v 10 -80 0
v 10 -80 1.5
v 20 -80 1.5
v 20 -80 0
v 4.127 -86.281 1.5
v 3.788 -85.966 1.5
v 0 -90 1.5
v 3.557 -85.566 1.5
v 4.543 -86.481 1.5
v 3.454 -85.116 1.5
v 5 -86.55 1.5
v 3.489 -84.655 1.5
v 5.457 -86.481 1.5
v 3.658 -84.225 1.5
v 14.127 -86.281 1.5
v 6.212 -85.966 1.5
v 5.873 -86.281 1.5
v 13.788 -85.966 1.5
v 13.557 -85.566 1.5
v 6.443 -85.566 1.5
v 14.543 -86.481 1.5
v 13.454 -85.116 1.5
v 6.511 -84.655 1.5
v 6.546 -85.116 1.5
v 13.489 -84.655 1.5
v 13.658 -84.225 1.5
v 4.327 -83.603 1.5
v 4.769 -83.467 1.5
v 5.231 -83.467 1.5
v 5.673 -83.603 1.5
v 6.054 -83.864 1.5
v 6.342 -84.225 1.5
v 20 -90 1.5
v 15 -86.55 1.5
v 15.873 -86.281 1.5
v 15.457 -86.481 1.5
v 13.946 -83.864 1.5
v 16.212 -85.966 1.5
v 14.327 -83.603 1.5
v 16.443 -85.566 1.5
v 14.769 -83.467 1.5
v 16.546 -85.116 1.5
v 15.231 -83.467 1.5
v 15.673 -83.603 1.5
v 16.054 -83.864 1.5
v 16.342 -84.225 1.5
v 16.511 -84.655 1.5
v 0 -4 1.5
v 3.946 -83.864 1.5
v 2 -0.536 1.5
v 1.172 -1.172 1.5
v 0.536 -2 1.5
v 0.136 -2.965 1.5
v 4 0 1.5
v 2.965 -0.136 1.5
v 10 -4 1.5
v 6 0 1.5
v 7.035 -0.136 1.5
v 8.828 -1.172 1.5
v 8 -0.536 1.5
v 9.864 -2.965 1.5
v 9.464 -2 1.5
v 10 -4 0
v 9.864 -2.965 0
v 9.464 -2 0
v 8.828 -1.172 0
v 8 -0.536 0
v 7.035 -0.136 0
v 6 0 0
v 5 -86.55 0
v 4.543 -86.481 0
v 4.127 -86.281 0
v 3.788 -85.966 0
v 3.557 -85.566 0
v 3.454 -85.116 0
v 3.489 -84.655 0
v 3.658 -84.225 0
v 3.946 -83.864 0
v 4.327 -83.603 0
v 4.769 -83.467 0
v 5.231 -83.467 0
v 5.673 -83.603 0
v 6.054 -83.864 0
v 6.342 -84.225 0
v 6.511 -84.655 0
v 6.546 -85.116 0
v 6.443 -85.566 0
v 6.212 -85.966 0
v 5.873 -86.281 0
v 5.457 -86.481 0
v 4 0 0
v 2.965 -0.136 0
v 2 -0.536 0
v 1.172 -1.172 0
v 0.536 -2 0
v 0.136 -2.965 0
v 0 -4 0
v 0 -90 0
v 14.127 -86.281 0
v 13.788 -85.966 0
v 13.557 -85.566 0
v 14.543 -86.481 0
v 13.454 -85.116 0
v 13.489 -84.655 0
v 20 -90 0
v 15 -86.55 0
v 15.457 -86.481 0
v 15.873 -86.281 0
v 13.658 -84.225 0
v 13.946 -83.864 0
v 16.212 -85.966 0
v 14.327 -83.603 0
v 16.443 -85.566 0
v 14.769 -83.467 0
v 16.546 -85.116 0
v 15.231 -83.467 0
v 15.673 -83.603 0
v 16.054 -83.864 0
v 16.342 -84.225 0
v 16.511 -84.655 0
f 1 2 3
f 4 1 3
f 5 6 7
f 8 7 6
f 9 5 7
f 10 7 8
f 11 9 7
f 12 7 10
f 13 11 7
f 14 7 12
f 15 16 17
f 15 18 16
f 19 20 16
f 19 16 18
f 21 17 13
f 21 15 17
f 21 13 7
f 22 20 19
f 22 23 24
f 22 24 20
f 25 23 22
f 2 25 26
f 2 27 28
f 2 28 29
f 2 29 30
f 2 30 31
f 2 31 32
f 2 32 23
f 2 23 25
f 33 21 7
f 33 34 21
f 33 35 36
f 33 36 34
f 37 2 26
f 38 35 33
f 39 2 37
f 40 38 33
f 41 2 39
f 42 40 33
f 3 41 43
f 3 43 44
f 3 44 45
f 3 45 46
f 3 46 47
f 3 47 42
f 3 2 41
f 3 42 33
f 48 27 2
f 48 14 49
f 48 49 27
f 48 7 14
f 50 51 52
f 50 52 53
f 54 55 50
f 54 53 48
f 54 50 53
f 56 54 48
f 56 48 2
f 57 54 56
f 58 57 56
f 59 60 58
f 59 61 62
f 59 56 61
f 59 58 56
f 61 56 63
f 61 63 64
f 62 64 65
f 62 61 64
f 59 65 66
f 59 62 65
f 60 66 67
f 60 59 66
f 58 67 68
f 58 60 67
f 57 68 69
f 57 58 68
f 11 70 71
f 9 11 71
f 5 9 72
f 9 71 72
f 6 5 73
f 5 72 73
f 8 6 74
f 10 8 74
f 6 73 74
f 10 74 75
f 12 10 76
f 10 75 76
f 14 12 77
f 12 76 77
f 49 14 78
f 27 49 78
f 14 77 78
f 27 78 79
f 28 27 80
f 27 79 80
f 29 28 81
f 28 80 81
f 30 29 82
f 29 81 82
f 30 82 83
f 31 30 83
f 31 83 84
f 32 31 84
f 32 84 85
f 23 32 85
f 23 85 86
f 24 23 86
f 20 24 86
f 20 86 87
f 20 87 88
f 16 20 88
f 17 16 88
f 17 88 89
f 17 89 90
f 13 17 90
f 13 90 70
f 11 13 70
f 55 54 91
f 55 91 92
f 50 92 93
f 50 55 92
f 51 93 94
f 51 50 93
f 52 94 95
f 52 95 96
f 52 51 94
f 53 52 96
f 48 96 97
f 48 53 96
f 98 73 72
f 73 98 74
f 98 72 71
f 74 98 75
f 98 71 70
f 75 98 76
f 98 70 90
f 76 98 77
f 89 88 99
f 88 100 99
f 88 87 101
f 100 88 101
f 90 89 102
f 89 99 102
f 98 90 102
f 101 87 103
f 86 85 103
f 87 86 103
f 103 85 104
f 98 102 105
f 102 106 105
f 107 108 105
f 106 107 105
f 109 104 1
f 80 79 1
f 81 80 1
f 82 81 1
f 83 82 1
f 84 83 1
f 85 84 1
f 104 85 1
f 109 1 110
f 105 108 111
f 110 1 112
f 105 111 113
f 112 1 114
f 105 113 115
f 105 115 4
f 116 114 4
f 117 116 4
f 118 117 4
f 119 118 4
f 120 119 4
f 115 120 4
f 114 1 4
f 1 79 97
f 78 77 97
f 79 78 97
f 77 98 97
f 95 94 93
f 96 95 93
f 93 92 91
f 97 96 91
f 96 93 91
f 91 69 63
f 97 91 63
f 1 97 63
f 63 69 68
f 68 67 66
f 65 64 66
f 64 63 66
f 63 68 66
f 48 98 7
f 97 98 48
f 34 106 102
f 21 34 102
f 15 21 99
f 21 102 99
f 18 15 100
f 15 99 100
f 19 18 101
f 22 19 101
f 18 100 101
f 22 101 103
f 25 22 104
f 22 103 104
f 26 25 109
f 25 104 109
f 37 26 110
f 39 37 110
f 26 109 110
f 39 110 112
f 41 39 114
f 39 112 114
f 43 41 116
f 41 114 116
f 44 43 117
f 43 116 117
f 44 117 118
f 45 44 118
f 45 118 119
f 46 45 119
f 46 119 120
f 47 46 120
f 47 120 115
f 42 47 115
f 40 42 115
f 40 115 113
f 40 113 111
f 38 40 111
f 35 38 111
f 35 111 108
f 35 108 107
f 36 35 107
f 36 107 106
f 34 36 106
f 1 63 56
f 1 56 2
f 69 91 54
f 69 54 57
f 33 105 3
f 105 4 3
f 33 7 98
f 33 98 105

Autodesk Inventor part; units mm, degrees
ref_plane "YZ Plane" through (0, 0, 0) normal (1, 0, 0) x (0, 1, 0)
ref_plane "XZ Plane" through (0, 0, 0) normal (0, 1, 0) x (-1, 0, 0)
ref_plane "XY Plane" through (0, 0, 0) normal (0, 0, 1) x (1, 0, 0)
sketch "スケッチ1" plane through (0, 0, 0) normal (0, 0, 1) x (1, 0, 0)
  line L0 (0, 0) -> (10, 0)
  line L1 (10, 0) -> (10, -80)
  line L2 (10, -80) -> (0, -80)
  line L3 (0, -80) -> (0, 0)
  dimension "d0" = 10
  dimension "d1" = 80
extrude "押し出し1" add sketch "スケッチ1" along normal blind 1.5
fillet "フィレット1" radius 4 2 edges at (10, 0, 0.75) (0, 0, 0.75)
sketch "スケッチ9" plane through (0, -80, 0) normal (0, -1, 0) x (1, 0, 0)
  line L0 (0, 0) -> (20, 0)
  line L1 (20, 0) -> (20, 1.5)
  line L2 (20, 1.5) -> (0, 1.5)
  line L3 (0, 1.5) -> (0, 0)
  line L4 (10, 0) -> (10, 1.5) projected
  line L5 (10, 0) -> (0, 0) projected
  dimension "d35" = 20
  dimension "d36" = 1.5
  dimension "d37" = 10
  dimension "d38" = 0
extrude "押し出し8" add sketch "スケッチ9" along normal blind 10
sketch "スケッチ10" plane through (0, 0, 1.5) normal (0, 0, 1) x (1, 0, 0)
  line L0 (20, -90) -> (0, -90) projected
  line L1 (0, -4) -> (0, -90) projected
  point P0 (0, 0)
  point P1 (5, -85)
  point P2 (15, -85)
  dimension "d41" = 10
  dimension "d42" = 5
  dimension "d43" = 5
hole "穴2" at (5, -85, 1.5) at (15, -85, 1.5) direction (0, 0, -1) diameter 3.1 end through all
properties part number "Fork 1 left ver2c" material "アルミニウム 5052 H32"
